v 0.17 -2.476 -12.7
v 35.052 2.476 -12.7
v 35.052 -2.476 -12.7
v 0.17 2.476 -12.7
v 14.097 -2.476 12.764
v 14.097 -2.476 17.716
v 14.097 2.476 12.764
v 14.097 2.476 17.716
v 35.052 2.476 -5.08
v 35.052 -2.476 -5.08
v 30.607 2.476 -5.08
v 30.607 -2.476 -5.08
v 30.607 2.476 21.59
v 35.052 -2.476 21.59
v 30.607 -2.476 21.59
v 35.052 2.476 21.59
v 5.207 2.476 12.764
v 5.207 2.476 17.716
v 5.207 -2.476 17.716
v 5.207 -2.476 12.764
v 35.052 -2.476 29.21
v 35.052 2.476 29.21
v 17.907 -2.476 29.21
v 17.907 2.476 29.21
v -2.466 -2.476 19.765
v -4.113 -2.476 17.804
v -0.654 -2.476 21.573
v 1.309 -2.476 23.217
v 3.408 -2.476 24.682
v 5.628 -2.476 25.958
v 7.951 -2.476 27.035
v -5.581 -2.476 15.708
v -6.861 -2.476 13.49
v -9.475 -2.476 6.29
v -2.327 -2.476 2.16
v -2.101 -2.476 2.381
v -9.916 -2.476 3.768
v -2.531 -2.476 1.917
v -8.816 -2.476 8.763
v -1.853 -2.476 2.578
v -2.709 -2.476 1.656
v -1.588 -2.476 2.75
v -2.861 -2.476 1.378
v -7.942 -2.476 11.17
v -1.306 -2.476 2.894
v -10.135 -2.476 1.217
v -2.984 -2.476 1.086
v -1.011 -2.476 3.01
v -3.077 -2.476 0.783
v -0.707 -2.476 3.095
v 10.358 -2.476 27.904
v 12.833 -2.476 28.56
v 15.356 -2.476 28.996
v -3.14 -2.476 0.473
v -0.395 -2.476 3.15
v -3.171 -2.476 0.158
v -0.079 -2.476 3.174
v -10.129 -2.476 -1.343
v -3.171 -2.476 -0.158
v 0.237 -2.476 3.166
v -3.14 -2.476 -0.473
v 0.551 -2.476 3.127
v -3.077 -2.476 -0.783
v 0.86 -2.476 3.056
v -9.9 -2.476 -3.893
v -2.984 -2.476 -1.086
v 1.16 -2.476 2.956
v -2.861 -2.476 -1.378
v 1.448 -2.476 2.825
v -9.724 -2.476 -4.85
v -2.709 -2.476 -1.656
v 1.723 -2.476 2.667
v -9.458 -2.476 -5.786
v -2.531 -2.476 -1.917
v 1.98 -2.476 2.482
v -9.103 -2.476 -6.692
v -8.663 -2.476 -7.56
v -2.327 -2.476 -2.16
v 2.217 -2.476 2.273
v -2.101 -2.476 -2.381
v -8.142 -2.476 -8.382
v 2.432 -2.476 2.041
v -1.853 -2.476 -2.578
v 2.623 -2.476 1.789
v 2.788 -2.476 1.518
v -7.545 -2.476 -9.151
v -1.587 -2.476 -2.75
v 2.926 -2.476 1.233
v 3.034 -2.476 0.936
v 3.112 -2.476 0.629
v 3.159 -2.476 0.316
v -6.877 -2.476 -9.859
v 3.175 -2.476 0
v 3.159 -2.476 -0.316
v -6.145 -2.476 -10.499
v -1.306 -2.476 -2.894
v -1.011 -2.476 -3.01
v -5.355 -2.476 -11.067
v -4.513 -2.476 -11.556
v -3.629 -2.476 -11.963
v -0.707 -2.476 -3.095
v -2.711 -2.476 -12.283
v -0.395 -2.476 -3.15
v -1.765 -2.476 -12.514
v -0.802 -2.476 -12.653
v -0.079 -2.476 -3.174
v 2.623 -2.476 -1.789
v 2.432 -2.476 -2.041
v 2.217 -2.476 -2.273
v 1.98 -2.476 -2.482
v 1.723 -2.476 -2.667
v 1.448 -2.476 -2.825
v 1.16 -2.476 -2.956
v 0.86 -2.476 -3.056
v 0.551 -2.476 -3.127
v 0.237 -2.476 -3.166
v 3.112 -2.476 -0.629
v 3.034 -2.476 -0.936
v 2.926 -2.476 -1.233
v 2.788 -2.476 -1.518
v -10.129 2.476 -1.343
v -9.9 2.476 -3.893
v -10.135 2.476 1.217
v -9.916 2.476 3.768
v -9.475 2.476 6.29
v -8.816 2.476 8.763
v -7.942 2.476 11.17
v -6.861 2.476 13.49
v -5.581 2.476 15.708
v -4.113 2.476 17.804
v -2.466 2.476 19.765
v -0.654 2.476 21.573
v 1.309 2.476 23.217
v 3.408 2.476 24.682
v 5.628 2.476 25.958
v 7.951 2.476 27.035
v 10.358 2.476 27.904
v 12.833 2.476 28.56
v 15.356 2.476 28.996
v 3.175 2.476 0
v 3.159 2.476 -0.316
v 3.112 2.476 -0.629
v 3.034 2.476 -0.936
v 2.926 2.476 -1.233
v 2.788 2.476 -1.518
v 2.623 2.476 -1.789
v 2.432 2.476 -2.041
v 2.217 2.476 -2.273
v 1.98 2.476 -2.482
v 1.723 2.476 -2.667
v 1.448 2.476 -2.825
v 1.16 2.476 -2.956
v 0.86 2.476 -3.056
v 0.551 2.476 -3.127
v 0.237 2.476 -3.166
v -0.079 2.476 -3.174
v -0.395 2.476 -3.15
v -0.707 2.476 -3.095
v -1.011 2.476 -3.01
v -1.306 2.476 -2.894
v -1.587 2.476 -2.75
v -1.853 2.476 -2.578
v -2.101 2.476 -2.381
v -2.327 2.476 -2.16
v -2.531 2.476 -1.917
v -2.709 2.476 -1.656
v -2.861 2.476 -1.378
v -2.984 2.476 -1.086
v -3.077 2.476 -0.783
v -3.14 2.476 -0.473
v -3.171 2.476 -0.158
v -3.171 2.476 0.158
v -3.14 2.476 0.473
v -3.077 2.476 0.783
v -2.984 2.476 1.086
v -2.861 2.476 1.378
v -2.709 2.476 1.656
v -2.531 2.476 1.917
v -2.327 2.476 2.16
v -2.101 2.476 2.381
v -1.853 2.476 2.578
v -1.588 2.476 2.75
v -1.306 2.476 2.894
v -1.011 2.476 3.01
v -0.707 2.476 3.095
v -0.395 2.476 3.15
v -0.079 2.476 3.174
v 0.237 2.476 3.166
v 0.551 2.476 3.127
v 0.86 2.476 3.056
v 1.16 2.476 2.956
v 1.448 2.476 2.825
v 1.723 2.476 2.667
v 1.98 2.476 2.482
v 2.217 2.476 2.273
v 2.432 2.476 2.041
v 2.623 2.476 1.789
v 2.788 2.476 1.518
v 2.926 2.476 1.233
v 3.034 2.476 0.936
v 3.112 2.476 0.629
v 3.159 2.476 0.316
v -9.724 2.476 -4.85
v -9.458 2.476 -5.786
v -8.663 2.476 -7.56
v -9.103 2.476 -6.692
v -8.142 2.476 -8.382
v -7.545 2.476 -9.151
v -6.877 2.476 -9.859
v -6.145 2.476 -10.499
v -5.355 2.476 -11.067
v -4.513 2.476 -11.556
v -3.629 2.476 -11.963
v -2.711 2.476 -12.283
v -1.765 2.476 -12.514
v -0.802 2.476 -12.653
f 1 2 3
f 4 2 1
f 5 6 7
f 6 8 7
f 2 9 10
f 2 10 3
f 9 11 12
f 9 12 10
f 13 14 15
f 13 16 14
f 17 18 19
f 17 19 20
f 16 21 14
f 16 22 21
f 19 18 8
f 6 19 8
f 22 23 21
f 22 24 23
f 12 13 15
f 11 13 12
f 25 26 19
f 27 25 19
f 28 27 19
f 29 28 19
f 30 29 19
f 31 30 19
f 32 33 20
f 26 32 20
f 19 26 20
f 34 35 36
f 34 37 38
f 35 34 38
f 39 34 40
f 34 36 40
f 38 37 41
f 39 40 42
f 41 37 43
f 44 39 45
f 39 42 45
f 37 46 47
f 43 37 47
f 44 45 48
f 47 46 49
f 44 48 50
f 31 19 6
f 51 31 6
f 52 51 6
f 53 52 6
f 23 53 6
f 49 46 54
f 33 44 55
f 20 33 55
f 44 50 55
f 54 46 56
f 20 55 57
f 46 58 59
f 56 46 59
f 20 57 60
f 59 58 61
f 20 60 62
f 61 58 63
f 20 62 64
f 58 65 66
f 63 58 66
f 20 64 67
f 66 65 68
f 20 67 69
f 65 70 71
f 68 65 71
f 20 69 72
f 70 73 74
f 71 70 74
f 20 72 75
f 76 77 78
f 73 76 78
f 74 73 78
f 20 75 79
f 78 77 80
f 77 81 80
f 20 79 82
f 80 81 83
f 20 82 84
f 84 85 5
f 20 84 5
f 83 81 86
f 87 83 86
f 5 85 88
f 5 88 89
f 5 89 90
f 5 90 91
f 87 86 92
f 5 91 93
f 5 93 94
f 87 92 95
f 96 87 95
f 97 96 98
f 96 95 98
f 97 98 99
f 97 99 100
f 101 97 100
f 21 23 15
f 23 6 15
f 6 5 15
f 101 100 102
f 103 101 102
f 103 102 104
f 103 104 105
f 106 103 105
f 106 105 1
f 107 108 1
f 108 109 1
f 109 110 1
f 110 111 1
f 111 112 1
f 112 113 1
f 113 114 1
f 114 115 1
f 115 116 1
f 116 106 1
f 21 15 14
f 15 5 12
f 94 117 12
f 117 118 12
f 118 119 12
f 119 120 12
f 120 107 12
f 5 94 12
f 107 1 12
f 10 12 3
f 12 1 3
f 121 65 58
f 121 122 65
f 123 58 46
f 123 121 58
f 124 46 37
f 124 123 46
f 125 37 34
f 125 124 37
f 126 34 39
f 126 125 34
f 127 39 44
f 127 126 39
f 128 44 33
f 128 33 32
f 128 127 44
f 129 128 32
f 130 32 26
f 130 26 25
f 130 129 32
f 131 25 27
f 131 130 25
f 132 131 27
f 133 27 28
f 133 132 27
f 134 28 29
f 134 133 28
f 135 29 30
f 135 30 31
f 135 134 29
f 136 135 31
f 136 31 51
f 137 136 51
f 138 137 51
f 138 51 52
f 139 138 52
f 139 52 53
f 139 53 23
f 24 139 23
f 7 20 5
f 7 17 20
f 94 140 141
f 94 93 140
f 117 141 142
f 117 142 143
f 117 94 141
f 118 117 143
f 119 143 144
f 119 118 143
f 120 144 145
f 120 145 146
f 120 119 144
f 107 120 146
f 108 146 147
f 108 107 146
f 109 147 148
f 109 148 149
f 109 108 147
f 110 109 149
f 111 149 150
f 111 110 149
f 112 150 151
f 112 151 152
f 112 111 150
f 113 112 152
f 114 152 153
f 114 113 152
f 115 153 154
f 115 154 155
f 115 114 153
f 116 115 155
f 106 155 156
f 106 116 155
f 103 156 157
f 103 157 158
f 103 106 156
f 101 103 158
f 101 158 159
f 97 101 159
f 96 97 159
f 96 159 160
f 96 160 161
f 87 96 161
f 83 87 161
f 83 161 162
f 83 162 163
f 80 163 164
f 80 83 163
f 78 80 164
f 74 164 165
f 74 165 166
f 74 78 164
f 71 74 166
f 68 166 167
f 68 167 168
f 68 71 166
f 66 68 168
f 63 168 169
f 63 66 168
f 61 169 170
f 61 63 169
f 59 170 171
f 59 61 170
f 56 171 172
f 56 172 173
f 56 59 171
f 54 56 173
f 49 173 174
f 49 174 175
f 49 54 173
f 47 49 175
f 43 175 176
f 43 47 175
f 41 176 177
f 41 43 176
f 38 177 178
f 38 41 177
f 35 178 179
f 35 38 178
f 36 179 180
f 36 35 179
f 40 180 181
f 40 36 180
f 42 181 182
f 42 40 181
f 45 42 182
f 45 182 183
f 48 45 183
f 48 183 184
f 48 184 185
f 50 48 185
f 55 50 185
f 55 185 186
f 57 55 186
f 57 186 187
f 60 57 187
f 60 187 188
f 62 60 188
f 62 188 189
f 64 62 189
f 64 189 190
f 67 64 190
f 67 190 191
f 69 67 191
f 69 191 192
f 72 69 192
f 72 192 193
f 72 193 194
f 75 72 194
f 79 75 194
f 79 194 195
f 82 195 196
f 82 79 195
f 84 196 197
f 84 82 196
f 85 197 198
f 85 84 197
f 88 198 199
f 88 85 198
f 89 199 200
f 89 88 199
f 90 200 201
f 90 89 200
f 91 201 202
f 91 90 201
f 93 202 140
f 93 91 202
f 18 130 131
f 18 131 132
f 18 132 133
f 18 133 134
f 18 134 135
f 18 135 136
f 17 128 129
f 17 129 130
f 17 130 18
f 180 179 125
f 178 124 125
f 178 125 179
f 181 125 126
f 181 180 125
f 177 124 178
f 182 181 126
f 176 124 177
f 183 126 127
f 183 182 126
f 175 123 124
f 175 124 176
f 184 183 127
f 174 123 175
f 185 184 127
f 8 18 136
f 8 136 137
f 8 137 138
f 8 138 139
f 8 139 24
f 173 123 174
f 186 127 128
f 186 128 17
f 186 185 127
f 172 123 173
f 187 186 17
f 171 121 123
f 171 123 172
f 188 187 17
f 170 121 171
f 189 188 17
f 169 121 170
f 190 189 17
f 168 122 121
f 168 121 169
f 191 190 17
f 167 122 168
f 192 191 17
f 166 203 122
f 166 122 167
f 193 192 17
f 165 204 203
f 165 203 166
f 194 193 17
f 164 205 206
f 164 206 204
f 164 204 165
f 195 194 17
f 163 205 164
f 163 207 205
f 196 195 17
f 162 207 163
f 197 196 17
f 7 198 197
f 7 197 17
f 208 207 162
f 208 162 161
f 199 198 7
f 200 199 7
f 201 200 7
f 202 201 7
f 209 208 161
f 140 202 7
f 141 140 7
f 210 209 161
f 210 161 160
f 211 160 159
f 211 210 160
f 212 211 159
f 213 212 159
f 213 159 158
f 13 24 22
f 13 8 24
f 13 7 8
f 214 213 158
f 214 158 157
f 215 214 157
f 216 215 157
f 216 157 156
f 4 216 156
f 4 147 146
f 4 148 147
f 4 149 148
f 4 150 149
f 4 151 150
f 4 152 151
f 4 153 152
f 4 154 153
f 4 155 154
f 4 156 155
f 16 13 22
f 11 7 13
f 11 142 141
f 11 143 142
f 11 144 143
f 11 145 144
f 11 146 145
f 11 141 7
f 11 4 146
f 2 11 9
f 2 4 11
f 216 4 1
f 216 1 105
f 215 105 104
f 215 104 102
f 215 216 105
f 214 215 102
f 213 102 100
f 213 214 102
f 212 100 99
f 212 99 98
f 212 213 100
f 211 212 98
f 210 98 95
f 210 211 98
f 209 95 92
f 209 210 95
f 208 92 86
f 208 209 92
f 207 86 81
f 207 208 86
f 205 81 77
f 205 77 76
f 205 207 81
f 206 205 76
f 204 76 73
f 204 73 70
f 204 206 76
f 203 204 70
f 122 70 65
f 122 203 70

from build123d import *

# Parameters (mm, degrees)
SKETCH1_R           = 3.175
SKETCH1_W           = 8.89
SKETCH1_H           = 4.953
BOSS_EXTRUDE1_DEPTH = 2.4765


with BuildPart() as part:
    # Sketch1 → Boss-Extrude1 (new, symmetric)
    with BuildSketch(Plane(origin=(0, 0, 0), x_dir=(1, 0, 0), z_dir=(0, 1, 0))):
        with BuildLine():
            Line((30.607, -21.59), (30.607, 5.08))
            Line((30.607, 5.08), (35.052, 5.08))
            Line((35.052, 5.08), (35.052, 12.7))
            Line((35.052, 12.7), (0.169883273, 12.7))
            ThreePointArc((0.169883273, 12.7), (-6.518875251, 10.18762116), (-9.899622874, 3.893013664))
            ThreePointArc((-9.899622874, 3.893013664), (-3.310755736, -18.802646574), (17.907, -29.21))
            Line((17.907, -29.21), (35.052, -29.21))
            Line((35.052, -29.21), (35.052, -21.59))
            Line((35.052, -21.59), (30.607, -21.59))
        make_face()
        Circle(SKETCH1_R, mode=Mode.SUBTRACT)
        with Locations((9.652, -15.24)):
            Rectangle(SKETCH1_W, SKETCH1_H, mode=Mode.SUBTRACT)
    extrude(amount=BOSS_EXTRUDE1_DEPTH, both=True)


solid = part.part
